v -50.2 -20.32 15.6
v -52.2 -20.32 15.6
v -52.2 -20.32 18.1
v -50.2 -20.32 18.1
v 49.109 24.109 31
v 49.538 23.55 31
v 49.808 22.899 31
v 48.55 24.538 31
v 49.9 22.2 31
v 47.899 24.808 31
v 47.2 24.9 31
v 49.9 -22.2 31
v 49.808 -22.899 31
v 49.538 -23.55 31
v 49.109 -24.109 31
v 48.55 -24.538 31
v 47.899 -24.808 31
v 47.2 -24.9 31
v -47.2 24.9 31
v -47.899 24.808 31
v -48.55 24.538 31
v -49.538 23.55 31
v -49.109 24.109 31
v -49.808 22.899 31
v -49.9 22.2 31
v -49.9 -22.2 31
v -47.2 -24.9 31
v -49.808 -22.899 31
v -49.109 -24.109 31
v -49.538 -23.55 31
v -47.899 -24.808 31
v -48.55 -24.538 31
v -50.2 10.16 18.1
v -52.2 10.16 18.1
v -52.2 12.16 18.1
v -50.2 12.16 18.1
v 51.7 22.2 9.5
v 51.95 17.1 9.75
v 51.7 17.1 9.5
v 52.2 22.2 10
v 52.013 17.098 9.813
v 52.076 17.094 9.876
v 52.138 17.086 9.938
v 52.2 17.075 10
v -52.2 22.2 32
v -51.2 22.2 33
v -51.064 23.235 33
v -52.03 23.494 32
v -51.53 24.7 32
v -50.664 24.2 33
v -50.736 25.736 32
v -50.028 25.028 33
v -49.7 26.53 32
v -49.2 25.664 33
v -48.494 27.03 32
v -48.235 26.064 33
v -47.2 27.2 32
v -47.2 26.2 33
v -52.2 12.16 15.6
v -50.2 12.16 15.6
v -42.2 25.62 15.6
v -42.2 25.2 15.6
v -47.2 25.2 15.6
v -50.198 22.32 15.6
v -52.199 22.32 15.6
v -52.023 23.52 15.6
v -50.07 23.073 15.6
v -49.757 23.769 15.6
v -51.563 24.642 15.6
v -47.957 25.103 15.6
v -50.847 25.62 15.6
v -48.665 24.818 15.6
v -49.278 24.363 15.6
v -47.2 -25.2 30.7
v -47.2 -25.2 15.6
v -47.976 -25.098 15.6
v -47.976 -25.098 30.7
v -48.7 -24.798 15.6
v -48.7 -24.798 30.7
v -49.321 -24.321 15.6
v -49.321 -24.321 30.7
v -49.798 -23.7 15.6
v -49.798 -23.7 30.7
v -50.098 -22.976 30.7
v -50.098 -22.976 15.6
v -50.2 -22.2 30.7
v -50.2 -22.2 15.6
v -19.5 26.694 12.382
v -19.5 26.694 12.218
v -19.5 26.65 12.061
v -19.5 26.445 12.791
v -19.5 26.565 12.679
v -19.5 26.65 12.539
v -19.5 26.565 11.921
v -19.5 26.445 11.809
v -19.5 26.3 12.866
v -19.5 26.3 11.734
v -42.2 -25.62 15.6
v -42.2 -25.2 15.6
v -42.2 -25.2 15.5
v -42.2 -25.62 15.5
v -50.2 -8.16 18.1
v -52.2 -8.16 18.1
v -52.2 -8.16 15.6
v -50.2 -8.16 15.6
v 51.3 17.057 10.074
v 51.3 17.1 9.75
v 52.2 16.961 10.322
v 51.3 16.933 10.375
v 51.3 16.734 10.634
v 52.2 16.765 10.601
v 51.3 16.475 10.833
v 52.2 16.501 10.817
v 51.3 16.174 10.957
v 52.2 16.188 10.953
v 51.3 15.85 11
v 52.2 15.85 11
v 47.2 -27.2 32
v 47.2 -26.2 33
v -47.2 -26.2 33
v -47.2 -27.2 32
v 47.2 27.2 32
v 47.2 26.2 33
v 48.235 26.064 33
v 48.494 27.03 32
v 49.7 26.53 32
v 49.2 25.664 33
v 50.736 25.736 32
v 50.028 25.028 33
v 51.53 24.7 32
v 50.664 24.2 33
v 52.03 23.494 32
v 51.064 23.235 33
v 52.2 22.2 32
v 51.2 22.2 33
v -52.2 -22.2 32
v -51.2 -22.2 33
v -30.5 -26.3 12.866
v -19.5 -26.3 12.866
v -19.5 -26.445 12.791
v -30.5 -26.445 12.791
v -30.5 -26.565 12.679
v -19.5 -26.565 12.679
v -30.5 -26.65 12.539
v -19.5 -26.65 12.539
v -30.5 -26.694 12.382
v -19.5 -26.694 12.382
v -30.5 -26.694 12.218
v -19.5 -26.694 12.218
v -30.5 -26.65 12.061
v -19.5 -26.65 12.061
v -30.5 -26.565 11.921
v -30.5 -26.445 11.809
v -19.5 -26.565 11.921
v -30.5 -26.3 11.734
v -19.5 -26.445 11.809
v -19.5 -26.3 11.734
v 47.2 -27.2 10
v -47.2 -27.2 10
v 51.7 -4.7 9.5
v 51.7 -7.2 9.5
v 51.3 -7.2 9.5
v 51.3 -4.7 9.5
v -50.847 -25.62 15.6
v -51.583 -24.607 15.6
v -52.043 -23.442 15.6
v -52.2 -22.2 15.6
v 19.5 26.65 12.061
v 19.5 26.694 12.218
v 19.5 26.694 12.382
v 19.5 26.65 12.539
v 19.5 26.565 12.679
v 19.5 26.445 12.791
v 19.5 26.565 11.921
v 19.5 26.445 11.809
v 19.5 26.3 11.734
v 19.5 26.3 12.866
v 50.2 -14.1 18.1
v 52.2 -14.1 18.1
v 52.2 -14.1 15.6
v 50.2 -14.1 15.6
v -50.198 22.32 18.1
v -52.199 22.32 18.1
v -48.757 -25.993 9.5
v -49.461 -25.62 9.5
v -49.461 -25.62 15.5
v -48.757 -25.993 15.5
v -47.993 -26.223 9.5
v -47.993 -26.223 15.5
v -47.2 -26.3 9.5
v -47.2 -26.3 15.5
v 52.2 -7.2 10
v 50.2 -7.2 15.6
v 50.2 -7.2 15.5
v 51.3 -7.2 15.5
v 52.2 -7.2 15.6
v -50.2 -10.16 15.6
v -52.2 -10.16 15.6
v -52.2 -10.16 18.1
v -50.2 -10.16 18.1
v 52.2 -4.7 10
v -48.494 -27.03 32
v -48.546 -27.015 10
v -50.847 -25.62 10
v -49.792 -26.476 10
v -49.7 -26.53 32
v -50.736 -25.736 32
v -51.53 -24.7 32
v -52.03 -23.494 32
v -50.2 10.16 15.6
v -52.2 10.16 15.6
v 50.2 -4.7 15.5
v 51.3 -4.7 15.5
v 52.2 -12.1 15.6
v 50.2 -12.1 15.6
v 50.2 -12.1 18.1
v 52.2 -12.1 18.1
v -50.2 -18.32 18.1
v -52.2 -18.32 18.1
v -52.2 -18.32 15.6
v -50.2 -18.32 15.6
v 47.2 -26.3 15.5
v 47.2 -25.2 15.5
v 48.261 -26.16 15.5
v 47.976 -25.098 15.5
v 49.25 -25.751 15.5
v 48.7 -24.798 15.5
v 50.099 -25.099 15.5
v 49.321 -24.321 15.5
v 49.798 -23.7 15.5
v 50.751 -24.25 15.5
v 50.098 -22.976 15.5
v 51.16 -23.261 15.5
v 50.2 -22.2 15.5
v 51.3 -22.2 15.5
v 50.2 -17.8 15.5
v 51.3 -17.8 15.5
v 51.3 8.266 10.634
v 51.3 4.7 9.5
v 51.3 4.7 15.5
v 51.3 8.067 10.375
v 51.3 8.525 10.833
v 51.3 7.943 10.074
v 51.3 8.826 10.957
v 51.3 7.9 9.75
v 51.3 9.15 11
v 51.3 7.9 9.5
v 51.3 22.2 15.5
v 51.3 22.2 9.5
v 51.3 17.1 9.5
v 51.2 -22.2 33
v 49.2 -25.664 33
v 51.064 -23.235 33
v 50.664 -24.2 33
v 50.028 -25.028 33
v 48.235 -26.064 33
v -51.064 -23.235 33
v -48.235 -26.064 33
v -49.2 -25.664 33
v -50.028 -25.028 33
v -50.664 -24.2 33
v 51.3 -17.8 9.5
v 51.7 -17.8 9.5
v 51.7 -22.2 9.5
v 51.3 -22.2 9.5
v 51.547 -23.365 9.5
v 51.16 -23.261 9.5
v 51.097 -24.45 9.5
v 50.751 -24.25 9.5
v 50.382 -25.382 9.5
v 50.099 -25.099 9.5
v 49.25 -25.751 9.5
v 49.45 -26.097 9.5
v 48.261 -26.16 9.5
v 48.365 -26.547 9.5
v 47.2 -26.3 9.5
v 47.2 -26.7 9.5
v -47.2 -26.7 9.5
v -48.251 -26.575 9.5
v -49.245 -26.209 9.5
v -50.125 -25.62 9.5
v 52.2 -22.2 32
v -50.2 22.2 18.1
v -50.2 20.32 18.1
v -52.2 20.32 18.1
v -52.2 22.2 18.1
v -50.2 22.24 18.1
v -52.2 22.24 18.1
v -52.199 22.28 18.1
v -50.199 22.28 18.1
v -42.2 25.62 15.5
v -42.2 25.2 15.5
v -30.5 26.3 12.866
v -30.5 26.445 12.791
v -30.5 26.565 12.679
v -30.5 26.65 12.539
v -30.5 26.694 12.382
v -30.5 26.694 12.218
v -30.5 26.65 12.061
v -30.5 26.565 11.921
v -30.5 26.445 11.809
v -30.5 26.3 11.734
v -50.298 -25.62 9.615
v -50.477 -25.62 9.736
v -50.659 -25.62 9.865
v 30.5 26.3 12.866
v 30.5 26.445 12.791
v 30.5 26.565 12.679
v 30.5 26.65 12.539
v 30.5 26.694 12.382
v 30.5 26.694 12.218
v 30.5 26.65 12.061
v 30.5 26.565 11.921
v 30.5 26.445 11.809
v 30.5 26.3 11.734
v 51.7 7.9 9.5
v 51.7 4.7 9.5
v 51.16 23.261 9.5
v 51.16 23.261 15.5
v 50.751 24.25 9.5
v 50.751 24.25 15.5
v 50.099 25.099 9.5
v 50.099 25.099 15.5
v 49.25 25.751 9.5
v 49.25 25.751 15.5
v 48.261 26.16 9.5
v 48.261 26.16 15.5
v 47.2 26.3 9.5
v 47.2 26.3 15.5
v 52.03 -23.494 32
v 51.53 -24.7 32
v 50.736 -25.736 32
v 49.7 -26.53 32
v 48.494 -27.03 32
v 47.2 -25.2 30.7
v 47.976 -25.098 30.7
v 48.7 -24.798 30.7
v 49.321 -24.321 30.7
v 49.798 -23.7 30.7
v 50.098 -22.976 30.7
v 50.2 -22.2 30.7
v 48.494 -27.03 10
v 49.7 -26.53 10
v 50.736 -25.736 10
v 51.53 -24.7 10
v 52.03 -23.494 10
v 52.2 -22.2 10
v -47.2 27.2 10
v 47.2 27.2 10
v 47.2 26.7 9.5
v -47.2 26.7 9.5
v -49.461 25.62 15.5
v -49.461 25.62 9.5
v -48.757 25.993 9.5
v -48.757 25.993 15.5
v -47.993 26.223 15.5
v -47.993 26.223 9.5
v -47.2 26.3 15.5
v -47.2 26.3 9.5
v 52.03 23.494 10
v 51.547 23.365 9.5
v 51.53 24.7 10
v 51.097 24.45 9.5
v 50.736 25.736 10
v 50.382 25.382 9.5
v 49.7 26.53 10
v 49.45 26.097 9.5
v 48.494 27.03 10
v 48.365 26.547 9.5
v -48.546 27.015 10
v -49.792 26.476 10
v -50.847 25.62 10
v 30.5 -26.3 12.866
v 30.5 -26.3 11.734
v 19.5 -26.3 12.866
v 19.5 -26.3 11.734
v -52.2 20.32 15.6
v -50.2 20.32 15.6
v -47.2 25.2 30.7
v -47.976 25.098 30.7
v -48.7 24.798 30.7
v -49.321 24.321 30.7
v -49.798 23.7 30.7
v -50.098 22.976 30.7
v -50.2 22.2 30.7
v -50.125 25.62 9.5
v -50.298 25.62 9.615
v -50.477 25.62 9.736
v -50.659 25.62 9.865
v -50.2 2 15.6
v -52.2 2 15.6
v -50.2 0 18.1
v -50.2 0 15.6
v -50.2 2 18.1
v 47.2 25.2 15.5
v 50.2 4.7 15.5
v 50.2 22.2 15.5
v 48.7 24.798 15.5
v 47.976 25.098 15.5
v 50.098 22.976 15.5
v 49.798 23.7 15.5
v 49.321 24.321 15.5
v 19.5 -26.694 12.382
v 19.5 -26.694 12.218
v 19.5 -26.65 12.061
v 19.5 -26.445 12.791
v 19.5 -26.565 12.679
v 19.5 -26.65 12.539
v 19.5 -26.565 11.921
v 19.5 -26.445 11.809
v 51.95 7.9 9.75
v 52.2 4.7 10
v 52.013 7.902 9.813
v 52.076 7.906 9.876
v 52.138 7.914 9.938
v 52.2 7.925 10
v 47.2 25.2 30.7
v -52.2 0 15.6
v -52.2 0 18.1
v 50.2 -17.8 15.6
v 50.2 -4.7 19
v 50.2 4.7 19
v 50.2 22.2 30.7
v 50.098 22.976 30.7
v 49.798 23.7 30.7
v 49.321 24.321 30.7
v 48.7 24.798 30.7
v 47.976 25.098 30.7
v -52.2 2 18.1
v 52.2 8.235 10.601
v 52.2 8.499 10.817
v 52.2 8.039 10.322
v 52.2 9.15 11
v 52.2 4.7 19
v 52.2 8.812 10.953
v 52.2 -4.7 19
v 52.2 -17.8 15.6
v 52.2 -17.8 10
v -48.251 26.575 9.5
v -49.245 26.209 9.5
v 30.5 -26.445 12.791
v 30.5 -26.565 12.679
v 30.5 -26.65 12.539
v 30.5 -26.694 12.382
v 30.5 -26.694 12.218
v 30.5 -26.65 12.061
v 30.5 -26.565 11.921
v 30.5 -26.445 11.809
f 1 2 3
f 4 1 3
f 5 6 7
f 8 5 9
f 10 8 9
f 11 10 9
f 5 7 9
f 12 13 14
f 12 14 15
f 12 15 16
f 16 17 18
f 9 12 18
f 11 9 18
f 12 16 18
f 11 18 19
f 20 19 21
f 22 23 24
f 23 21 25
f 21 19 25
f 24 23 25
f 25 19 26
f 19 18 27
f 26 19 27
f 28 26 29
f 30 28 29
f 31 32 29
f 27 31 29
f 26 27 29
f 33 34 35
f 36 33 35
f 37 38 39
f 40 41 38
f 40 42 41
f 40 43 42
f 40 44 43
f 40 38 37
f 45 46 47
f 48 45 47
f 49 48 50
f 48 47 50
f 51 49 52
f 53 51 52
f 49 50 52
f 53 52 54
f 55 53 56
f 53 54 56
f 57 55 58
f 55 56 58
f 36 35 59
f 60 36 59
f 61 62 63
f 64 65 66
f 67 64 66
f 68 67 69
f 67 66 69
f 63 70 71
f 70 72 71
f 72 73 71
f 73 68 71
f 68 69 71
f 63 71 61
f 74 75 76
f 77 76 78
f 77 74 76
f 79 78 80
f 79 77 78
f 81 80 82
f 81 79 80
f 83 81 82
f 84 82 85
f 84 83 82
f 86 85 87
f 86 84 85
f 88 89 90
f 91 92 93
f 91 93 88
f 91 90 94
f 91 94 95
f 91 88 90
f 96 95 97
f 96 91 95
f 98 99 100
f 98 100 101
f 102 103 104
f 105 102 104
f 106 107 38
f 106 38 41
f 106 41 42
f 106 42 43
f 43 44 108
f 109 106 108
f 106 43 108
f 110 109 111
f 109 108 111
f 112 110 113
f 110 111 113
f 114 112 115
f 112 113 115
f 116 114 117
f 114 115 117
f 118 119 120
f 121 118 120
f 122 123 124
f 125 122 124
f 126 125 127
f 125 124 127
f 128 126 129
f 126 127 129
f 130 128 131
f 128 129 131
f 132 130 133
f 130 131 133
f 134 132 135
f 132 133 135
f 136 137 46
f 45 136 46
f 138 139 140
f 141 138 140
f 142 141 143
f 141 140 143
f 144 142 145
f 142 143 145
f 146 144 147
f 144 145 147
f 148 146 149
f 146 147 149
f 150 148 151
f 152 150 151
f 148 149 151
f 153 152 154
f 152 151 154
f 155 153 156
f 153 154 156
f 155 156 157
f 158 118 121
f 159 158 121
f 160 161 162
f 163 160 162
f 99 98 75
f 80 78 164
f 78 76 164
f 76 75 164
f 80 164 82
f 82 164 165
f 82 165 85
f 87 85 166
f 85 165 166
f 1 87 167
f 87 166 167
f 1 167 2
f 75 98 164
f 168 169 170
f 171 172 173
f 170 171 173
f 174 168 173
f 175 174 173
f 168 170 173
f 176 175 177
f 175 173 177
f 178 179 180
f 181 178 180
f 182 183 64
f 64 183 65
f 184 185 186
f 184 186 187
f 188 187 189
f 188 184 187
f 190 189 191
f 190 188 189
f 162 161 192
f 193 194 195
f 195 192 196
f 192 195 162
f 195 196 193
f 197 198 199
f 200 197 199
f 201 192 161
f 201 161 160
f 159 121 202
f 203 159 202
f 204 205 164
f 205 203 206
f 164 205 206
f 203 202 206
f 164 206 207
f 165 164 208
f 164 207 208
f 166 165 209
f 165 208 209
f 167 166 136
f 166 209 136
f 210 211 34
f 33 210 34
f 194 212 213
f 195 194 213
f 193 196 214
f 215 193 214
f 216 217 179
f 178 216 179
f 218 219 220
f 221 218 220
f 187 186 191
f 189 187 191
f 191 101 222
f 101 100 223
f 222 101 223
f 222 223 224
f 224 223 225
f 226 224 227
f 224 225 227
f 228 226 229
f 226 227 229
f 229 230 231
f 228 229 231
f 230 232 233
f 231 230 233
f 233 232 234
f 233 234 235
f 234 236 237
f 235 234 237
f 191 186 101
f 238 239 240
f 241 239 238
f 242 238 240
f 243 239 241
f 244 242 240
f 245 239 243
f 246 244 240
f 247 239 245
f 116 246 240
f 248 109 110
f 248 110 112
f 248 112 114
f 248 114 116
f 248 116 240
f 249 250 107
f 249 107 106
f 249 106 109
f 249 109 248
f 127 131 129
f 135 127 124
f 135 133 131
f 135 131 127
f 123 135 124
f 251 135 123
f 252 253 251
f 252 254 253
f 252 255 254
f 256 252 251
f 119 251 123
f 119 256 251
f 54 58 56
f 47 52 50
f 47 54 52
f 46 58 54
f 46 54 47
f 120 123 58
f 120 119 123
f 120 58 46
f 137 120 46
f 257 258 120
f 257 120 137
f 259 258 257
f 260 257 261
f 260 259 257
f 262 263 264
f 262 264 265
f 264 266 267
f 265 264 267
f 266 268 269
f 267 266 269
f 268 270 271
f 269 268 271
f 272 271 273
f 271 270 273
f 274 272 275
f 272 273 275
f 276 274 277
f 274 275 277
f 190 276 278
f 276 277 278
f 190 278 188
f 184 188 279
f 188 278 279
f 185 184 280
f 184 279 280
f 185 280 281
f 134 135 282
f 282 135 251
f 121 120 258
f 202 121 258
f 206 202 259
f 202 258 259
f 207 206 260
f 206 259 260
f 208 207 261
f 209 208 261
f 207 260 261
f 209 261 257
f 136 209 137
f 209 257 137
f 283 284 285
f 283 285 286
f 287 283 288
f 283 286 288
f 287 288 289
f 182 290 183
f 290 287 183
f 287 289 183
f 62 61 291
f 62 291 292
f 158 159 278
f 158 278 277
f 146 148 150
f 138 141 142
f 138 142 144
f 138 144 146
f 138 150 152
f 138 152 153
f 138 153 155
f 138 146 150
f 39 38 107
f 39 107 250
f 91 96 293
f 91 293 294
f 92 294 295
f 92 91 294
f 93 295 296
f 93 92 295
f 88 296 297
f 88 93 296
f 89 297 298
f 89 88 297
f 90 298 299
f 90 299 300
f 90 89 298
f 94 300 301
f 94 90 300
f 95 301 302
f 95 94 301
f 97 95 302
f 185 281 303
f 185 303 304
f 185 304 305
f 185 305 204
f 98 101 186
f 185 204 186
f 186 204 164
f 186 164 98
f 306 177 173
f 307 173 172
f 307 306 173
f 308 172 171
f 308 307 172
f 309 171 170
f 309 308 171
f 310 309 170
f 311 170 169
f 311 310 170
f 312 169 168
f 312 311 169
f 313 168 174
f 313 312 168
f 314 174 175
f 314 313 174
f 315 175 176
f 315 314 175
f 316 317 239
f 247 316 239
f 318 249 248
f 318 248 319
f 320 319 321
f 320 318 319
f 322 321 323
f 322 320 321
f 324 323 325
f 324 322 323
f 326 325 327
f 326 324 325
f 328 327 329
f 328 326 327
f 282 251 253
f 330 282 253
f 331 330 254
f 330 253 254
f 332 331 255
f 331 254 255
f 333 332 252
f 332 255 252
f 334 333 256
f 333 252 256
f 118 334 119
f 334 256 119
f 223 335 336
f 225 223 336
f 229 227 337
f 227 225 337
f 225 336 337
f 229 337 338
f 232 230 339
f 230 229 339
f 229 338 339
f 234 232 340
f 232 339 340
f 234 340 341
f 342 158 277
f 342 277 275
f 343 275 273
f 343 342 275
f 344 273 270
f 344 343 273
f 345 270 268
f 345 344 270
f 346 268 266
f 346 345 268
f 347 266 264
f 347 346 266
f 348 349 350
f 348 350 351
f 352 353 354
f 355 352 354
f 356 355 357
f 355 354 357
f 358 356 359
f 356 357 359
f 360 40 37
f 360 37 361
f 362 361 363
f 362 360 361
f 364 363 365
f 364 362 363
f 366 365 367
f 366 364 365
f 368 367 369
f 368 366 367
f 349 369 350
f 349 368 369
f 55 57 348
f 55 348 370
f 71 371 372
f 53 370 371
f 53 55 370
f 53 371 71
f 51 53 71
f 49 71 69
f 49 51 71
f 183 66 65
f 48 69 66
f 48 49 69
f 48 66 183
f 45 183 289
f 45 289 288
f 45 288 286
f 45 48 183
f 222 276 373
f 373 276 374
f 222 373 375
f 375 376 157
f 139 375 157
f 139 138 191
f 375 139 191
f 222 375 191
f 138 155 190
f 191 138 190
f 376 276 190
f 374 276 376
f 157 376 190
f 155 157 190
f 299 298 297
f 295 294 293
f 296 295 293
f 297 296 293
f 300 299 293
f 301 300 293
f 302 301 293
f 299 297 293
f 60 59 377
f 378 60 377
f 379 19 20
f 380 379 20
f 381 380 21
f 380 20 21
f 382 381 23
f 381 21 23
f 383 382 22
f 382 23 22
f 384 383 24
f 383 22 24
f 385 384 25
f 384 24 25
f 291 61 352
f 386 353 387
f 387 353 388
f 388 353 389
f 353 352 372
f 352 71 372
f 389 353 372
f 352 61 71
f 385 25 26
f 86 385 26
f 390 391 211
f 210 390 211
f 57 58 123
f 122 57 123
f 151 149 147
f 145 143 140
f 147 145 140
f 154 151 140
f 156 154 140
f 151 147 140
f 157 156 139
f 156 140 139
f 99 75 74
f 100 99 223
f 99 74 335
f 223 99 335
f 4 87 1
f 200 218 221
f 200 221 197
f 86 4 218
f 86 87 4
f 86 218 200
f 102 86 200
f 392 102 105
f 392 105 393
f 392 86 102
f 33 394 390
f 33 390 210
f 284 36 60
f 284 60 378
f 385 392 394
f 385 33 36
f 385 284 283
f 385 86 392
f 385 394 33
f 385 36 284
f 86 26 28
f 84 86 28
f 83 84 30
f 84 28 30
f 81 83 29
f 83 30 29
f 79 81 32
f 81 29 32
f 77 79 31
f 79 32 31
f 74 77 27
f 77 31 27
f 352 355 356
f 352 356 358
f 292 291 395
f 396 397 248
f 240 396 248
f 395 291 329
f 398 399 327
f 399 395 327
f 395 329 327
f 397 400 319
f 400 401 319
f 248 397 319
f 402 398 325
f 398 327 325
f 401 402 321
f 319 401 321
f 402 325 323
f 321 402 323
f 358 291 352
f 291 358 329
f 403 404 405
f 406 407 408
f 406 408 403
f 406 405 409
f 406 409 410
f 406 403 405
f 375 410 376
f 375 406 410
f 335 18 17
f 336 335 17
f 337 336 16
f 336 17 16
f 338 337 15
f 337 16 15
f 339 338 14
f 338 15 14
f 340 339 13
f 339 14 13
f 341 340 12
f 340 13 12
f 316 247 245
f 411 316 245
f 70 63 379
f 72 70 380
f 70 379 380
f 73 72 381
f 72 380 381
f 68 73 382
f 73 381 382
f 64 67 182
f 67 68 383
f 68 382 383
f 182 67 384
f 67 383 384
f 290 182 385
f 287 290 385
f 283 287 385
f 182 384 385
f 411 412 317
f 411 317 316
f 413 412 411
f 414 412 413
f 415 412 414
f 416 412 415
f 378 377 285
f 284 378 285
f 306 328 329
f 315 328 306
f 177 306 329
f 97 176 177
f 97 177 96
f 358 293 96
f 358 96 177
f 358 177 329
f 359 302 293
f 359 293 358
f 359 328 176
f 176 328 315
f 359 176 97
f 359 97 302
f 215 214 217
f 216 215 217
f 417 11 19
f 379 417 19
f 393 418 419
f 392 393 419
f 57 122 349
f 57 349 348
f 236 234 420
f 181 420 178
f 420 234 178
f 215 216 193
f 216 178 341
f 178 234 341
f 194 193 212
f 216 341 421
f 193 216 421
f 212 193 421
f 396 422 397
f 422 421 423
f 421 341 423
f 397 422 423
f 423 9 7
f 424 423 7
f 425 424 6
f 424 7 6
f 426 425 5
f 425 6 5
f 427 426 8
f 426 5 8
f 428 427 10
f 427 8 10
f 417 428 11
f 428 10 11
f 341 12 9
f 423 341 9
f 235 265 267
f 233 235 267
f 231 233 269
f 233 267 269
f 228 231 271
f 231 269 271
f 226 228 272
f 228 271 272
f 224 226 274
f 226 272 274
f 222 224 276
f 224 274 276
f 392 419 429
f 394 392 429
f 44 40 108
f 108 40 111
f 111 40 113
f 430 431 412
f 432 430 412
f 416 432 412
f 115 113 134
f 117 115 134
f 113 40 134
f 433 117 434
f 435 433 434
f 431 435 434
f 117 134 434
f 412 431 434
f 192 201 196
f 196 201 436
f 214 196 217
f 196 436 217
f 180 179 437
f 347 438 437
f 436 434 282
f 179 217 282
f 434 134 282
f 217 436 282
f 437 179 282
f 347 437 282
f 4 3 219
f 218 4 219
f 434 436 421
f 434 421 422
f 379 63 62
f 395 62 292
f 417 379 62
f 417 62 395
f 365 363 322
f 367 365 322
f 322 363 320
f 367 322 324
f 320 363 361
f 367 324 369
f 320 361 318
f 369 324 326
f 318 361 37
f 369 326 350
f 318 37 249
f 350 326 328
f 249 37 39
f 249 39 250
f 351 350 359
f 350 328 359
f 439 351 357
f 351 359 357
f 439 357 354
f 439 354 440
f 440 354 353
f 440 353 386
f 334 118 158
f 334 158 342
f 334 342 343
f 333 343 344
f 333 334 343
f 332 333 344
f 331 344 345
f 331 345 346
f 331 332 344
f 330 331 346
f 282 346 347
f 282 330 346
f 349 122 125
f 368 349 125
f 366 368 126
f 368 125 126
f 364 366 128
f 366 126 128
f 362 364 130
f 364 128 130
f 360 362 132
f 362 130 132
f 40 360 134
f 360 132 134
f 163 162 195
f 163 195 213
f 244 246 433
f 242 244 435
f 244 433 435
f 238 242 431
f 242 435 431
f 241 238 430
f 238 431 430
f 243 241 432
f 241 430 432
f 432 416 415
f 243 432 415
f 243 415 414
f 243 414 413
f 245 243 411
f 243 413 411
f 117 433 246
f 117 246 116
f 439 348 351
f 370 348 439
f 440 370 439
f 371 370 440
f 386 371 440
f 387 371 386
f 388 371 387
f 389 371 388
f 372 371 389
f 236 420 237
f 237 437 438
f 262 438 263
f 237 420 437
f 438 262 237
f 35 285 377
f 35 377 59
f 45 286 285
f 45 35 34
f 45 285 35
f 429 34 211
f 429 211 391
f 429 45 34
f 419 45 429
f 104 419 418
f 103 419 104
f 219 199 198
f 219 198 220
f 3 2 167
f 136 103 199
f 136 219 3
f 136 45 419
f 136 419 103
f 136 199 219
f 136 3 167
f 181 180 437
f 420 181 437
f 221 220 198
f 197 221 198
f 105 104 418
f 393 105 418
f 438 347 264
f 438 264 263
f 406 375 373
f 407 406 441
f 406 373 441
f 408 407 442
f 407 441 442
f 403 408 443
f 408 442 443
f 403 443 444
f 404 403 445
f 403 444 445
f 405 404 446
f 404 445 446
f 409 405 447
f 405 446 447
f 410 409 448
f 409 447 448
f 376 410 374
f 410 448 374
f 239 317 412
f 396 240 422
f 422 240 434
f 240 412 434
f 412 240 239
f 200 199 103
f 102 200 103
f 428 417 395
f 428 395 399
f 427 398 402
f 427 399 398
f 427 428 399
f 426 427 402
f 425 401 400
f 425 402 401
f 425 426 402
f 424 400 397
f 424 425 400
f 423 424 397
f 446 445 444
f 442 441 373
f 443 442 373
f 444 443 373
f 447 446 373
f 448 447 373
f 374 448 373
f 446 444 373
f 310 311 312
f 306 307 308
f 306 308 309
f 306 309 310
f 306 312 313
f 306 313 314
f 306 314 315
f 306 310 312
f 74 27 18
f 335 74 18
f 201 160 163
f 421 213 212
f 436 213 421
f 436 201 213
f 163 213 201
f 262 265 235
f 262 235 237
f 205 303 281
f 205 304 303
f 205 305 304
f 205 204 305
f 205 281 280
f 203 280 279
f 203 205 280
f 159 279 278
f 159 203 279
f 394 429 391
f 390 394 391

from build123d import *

# Parameters (mm, degrees)
PAD010_DEPTH                  = 23.5
POCKET028_DEPTH               = 6
PAD010_MIRRORED018_2_DEPTH    = 23.5
POCKET028_MIRRORED018_2_DEPTH = 6
PAD015_DEPTH                  = 2
PAD015_MIRRORED021_2_DEPTH    = 2
POCKET036_DEPTH               = 30.5
PAD016_DEPTH                  = 19.5
PAD016_FACE36_W               = 39
PAD016_FACE36_H               = 1.2
POCKET037_DEPTH               = 0.2
CHAMFER022_SIZE               = 0.5
CHAMFER020_SIZE               = 1
CHAMFER024_SIZE               = 0.2999
POCKET046_DEPTH               = 10
SKETCH049_W                   = 9.4
SKETCH049_H                   = 50
POCKET033_DEPTH               = 15
POCKET041_DEPTH               = 5
POCKET044_DEPTH               = 10
POCKET040_DEPTH               = 10
POCKET042_DEPTH               = 10
POCKET043_DEPTH               = 10
POCKET030_DEPTH               = 10


with BuildPart() as part:
    # Sketch033 (on DatumPlane) → Pad010 (new body)
    with BuildSketch(Plane.XY.offset(33)):
        with BuildLine():
            ThreePointArc((-47.2, 27.2), (-50.735534, 25.735534), (-52.2, 22.2))
            Line((-52.2, 0), (-52.2, 22.2))
            Line((-50.2, 0), (-52.2, 0))
            Line((-50.2, 22.2), (-50.2, 0))
            ThreePointArc((-47.2, 25.2), (-49.32132, 24.32132), (-50.2, 22.2))
            Line((0, 25.2), (-47.2, 25.2))
            Line((0, 27.2), (0, 25.2))
            Line((-47.2, 27.2), (0, 27.2))
        make_face()
    pad010 = extrude(amount=-PAD010_DEPTH)

    # Sketch031 (on Face10 of Pad010) → Pocket028 (cut)
    with BuildSketch(Plane(origin=(0, 0, 9.5), x_dir=(1, 0, 0), z_dir=(0, 0, -1))):
        with BuildLine():
            ThreePointArc((-50.2, -22.2), (-49.32132, -24.32132), (-47.2, -25.2))
            Line((-47.2, -25.2), (0, -25.2))
            Line((0, -25.2), (0, -26.3))
            Line((0, -26.3), (-47.2, -26.3))
            ThreePointArc((-51.3, -22.2), (-50.099138, -25.099138), (-47.2, -26.3))
            Line((-51.3, 0), (-51.3, -22.2))
            Line((-50.2, 0), (-51.3, 0))
            Line((-50.2, -22.2), (-50.2, 0))
        make_face()
    pocket028 = extrude(amount=-POCKET028_DEPTH, mode=Mode.SUBTRACT)

    # Sketch033 Mirrored018 2 → Pad010 Mirrored018 2 (add)
    with BuildSketch(Plane(origin=(0, 0, 33), x_dir=(-1, 0, 0), z_dir=(0, 0, -1))):
        with BuildLine():
            ThreePointArc((-47.2, 27.2), (-50.735534, 25.735534), (-52.2, 22.2))
            Line((-52.2, 0), (-52.2, 22.2))
            Line((-50.2, 0), (-52.2, 0))
            Line((-50.2, 22.2), (-50.2, 0))
            ThreePointArc((-47.2, 25.2), (-49.32132, 24.32132), (-50.2, 22.2))
            Line((0, 25.2), (-47.2, 25.2))
            Line((0, 27.2), (0, 25.2))
            Line((-47.2, 27.2), (0, 27.2))
        make_face()
    pad010_mirrored018_2 = extrude(amount=PAD010_MIRRORED018_2_DEPTH)

    # Sketch031 Mirrored018 2 → Pocket028 Mirrored018 2 (cut)
    with BuildSketch(Plane(origin=(0, 0, 9.5), x_dir=(-1, 0, 0), z_dir=(0, 0, 1))):
        with BuildLine():
            ThreePointArc((-50.2, -22.2), (-49.32132, -24.32132), (-47.2, -25.2))
            Line((-47.2, -25.2), (0, -25.2))
            Line((0, -25.2), (0, -26.3))
            Line((0, -26.3), (-47.2, -26.3))
            ThreePointArc((-51.3, -22.2), (-50.099138, -25.099138), (-47.2, -26.3))
            Line((-51.3, 0), (-51.3, -22.2))
            Line((-50.2, 0), (-51.3, 0))
            Line((-50.2, -22.2), (-50.2, 0))
        make_face()
    pocket028_mirrored018_2 = extrude(amount=POCKET028_MIRRORED018_2_DEPTH, mode=Mode.SUBTRACT)

    # Mirrored020: Pad010, Pocket028, Pad010 Mirrored018 2, Pocket028 Mirrored018 2 across Sketch033 H_Axis
    add(pad010.mirror(Plane(origin=(0, 0, 33), x_dir=(0, 0, 1), z_dir=(0, 1, 0))))
    add(pocket028.mirror(Plane(origin=(0, 0, 33), x_dir=(0, 0, 1), z_dir=(0, 1, 0))), mode=Mode.SUBTRACT)
    add(pad010_mirrored018_2.mirror(Plane(origin=(0, 0, 33), x_dir=(0, 0, 1), z_dir=(0, 1, 0))))
    add(pocket028_mirrored018_2.mirror(Plane(origin=(0, 0, 33), x_dir=(0, 0, 1), z_dir=(0, 1, 0))), mode=Mode.SUBTRACT)

    # Sketch044 (on DatumPlane) → Pad015 (join)
    with BuildSketch(Plane.XY.offset(33)):
        with BuildLine():
            ThreePointArc((-47.2, 25.2), (-49.32132, 24.32132), (-50.2, 22.2))
            Line((-50.2, 22.2), (-50.2, 0))
            Line((-50.2, 0), (0, 0))
            Line((0, 0), (0, 25.2))
            Line((0, 25.2), (-47.2, 25.2))
        make_face()
    pad015 = extrude(amount=-PAD015_DEPTH)

    # Sketch044 Mirrored021 2 → Pad015 Mirrored021 2 (add)
    with BuildSketch(Plane(origin=(0, 0, 33), x_dir=(-1, 0, 0), z_dir=(0, 0, -1))):
        with BuildLine():
            ThreePointArc((-47.2, 25.2), (-49.32132, 24.32132), (-50.2, 22.2))
            Line((-50.2, 22.2), (-50.2, 0))
            Line((-50.2, 0), (0, 0))
            Line((0, 0), (0, 25.2))
            Line((0, 25.2), (-47.2, 25.2))
        make_face()
    pad015_mirrored021_2 = extrude(amount=PAD015_MIRRORED021_2_DEPTH)

    # Mirrored027: Pad015, Pad015 Mirrored021 2 across Sketch044 H_Axis
    add(pad015.mirror(Plane(origin=(0, 0, 33), x_dir=(0, 0, 1), z_dir=(0, 1, 0))))
    add(pad015_mirrored021_2.mirror(Plane(origin=(0, 0, 33), x_dir=(0, 0, 1), z_dir=(0, 1, 0))))

    # Sketch055 → Pocket036 (cut, symmetric)
    with BuildSketch(Plane.YZ):
        with BuildLine():
            ThreePointArc((-26.1, 12.9), (-26.7, 12.3), (-26.1, 11.7))
            Line((-26.1, 12.9), (-26.1, 11.7))
        make_face()
    pocket036 = extrude(amount=POCKET036_DEPTH, both=True, mode=Mode.SUBTRACT)

    # Sketch055 → Pad016 (join, symmetric)
    with BuildSketch(Plane.YZ):
        with BuildLine():
            ThreePointArc((-26.1, 12.9), (-26.7, 12.3), (-26.1, 11.7))
            Line((-26.1, 12.9), (-26.1, 11.7))
        make_face()
    pad016 = extrude(amount=PAD016_DEPTH, both=True)

    # Pad016 Face36 → Pocket037 (cut)
    with BuildSketch(Plane(origin=(0, -26.1, 12.3), x_dir=(1, 0, 0), z_dir=(0, 1, 0))):
        Rectangle(PAD016_FACE36_W, PAD016_FACE36_H)
    pocket037 = extrude(amount=-POCKET037_DEPTH, mode=Mode.SUBTRACT)

    # Mirrored028: Pocket036, Pad016, Pocket037 across Sketch055 V_Axis
    add(pocket036.mirror(Plane(origin=(0, 0, 0), x_dir=(1, 0, 0), z_dir=(0, 1, 0))), mode=Mode.SUBTRACT)
    add(pad016.mirror(Plane(origin=(0, 0, 0), x_dir=(1, 0, 0), z_dir=(0, 1, 0))))
    add(pocket037.mirror(Plane(origin=(0, 0, 0), x_dir=(1, 0, 0), z_dir=(0, 1, 0))), mode=Mode.SUBTRACT)

    # Chamfer022
    chamfer022_edges = [part.edges().sort_by_distance(p)[0] for p in [
        (0, -27.2, 9.5),
    ]]
    chamfer(chamfer022_edges, length=CHAMFER022_SIZE)

    # Chamfer020
    chamfer020_edges = [part.edges().sort_by_distance(p)[0] for p in [
        (0, -27.2, 33),
    ]]
    chamfer(chamfer020_edges, length=CHAMFER020_SIZE)

    # Chamfer024
    chamfer024_edges = [part.edges().sort_by_distance(p)[0] for p in [
        (50.2, 0, 31),
    ]]
    chamfer(chamfer024_edges, length=CHAMFER024_SIZE)

    # Sketch041 (on DatumPlane) → Pocket046 (cut)
    with BuildSketch(Plane.YZ.offset(52.2)):
        Polygon((-7.2, 7.6), (-7.2, 15.6), (-12.1, 15.6), (-12.1, 18.1), (-14.1, 18.1), (-14.1, 15.6), (-17.8, 15.6), (-17.8, 7.6), (-17.8, 2.6), (-7.2, 2.6), align=None)
    extrude(amount=-POCKET046_DEPTH, mode=Mode.SUBTRACT)

    # Sketch049 (on DatumPlane) → Pocket033 (cut)
    with BuildSketch(Plane.YZ.offset(52.2)):
        with Locations((0, -6)):
            Rectangle(SKETCH049_W, SKETCH049_H)
    extrude(amount=-POCKET033_DEPTH, mode=Mode.SUBTRACT)

    # Sketch056 (on DatumPlane) → Pocket041 (cut)
    with BuildSketch(Plane.YZ.offset(52.2)):
        with BuildLine():
            Line((7.9, -40.25), (7.9, 9.75))
            ThreePointArc((9.15, 11), (8.266117, 10.633883), (7.9, 9.75))
            Line((9.15, 11), (15.85, 11))
            ThreePointArc((17.1, 9.75), (16.733883, 10.633883), (15.85, 11))
            Line((17.1, 9.75), (17.1, -40.25))
            Line((7.9, -40.25), (17.1, -40.25))
        make_face()
    extrude(amount=-POCKET041_DEPTH, mode=Mode.SUBTRACT)

    # Sketch050 (on DatumPlane) → Pocket044 (cut)
    with BuildSketch(Plane(origin=(-52.2, 0, 0), x_dir=(0, -1, 0), z_dir=(-1, 0, 0))):
        Polygon((-15.02, 7.6), (-15.02, 15.6), (-20.32, 15.6), (-20.32, 18.1), (-22.32, 18.1), (-22.32, 15.6), (-25.62, 15.6), (-25.62, 7.6), (-25.62, -42.4), (-15.02, -42.4), align=None)
    extrude(amount=-POCKET044_DEPTH, mode=Mode.SUBTRACT)

    # Sketch046 (on DatumPlane) → Pocket040 (cut)
    with BuildSketch(Plane(origin=(-52.2, 0, 0), x_dir=(0, -1, 0), z_dir=(-1, 0, 0))):
        Polygon((-4.86, 7.6), (-4.86, 15.6), (-10.16, 15.6), (-10.16, 18.1), (-12.16, 18.1), (-12.16, 15.6), (-15.46, 15.6), (-15.46, 7.6), (-15.46, -42.4), (-4.86, -42.4), align=None)
    extrude(amount=-POCKET040_DEPTH, mode=Mode.SUBTRACT)

    # Sketch057 (on DatumPlane) → Pocket042 (cut)
    with BuildSketch(Plane(origin=(-52.2, 0, 0), x_dir=(0, -1, 0), z_dir=(-1, 0, 0))):
        Polygon((5.3, 7.6), (5.3, 15.6), (0, 15.6), (0, 18.1), (-2, 18.1), (-2, 15.6), (-5.3, 15.6), (-5.3, 7.6), (-5.3, -42.4), (5.3, -42.4), align=None)
    extrude(amount=-POCKET042_DEPTH, mode=Mode.SUBTRACT)

    # Sketch054 (on DatumPlane) → Pocket043 (cut)
    with BuildSketch(Plane(origin=(-52.2, 0, 0), x_dir=(0, -1, 0), z_dir=(-1, 0, 0))):
        Polygon((15.46, 7.6), (15.46, 15.6), (10.16, 15.6), (10.16, 18.1), (8.16, 18.1), (8.16, 15.6), (4.86, 15.6), (4.86, 7.6), (4.86, -42.4), (15.46, -42.4), align=None)
    extrude(amount=-POCKET043_DEPTH, mode=Mode.SUBTRACT)

    # Sketch039 (on DatumPlane) → Pocket030 (cut)
    with BuildSketch(Plane(origin=(-52.2, 0, 0), x_dir=(0, -1, 0), z_dir=(-1, 0, 0))):
        Polygon((25.62, 7.6), (25.62, 15.6), (20.32, 15.6), (20.32, 18.1), (18.32, 18.1), (18.32, 15.6), (15.02, 15.6), (15.02, 7.6), (15.02, -42.4), (25.62, -42.4), align=None)
    extrude(amount=-POCKET030_DEPTH, mode=Mode.SUBTRACT)


solid = part.part
